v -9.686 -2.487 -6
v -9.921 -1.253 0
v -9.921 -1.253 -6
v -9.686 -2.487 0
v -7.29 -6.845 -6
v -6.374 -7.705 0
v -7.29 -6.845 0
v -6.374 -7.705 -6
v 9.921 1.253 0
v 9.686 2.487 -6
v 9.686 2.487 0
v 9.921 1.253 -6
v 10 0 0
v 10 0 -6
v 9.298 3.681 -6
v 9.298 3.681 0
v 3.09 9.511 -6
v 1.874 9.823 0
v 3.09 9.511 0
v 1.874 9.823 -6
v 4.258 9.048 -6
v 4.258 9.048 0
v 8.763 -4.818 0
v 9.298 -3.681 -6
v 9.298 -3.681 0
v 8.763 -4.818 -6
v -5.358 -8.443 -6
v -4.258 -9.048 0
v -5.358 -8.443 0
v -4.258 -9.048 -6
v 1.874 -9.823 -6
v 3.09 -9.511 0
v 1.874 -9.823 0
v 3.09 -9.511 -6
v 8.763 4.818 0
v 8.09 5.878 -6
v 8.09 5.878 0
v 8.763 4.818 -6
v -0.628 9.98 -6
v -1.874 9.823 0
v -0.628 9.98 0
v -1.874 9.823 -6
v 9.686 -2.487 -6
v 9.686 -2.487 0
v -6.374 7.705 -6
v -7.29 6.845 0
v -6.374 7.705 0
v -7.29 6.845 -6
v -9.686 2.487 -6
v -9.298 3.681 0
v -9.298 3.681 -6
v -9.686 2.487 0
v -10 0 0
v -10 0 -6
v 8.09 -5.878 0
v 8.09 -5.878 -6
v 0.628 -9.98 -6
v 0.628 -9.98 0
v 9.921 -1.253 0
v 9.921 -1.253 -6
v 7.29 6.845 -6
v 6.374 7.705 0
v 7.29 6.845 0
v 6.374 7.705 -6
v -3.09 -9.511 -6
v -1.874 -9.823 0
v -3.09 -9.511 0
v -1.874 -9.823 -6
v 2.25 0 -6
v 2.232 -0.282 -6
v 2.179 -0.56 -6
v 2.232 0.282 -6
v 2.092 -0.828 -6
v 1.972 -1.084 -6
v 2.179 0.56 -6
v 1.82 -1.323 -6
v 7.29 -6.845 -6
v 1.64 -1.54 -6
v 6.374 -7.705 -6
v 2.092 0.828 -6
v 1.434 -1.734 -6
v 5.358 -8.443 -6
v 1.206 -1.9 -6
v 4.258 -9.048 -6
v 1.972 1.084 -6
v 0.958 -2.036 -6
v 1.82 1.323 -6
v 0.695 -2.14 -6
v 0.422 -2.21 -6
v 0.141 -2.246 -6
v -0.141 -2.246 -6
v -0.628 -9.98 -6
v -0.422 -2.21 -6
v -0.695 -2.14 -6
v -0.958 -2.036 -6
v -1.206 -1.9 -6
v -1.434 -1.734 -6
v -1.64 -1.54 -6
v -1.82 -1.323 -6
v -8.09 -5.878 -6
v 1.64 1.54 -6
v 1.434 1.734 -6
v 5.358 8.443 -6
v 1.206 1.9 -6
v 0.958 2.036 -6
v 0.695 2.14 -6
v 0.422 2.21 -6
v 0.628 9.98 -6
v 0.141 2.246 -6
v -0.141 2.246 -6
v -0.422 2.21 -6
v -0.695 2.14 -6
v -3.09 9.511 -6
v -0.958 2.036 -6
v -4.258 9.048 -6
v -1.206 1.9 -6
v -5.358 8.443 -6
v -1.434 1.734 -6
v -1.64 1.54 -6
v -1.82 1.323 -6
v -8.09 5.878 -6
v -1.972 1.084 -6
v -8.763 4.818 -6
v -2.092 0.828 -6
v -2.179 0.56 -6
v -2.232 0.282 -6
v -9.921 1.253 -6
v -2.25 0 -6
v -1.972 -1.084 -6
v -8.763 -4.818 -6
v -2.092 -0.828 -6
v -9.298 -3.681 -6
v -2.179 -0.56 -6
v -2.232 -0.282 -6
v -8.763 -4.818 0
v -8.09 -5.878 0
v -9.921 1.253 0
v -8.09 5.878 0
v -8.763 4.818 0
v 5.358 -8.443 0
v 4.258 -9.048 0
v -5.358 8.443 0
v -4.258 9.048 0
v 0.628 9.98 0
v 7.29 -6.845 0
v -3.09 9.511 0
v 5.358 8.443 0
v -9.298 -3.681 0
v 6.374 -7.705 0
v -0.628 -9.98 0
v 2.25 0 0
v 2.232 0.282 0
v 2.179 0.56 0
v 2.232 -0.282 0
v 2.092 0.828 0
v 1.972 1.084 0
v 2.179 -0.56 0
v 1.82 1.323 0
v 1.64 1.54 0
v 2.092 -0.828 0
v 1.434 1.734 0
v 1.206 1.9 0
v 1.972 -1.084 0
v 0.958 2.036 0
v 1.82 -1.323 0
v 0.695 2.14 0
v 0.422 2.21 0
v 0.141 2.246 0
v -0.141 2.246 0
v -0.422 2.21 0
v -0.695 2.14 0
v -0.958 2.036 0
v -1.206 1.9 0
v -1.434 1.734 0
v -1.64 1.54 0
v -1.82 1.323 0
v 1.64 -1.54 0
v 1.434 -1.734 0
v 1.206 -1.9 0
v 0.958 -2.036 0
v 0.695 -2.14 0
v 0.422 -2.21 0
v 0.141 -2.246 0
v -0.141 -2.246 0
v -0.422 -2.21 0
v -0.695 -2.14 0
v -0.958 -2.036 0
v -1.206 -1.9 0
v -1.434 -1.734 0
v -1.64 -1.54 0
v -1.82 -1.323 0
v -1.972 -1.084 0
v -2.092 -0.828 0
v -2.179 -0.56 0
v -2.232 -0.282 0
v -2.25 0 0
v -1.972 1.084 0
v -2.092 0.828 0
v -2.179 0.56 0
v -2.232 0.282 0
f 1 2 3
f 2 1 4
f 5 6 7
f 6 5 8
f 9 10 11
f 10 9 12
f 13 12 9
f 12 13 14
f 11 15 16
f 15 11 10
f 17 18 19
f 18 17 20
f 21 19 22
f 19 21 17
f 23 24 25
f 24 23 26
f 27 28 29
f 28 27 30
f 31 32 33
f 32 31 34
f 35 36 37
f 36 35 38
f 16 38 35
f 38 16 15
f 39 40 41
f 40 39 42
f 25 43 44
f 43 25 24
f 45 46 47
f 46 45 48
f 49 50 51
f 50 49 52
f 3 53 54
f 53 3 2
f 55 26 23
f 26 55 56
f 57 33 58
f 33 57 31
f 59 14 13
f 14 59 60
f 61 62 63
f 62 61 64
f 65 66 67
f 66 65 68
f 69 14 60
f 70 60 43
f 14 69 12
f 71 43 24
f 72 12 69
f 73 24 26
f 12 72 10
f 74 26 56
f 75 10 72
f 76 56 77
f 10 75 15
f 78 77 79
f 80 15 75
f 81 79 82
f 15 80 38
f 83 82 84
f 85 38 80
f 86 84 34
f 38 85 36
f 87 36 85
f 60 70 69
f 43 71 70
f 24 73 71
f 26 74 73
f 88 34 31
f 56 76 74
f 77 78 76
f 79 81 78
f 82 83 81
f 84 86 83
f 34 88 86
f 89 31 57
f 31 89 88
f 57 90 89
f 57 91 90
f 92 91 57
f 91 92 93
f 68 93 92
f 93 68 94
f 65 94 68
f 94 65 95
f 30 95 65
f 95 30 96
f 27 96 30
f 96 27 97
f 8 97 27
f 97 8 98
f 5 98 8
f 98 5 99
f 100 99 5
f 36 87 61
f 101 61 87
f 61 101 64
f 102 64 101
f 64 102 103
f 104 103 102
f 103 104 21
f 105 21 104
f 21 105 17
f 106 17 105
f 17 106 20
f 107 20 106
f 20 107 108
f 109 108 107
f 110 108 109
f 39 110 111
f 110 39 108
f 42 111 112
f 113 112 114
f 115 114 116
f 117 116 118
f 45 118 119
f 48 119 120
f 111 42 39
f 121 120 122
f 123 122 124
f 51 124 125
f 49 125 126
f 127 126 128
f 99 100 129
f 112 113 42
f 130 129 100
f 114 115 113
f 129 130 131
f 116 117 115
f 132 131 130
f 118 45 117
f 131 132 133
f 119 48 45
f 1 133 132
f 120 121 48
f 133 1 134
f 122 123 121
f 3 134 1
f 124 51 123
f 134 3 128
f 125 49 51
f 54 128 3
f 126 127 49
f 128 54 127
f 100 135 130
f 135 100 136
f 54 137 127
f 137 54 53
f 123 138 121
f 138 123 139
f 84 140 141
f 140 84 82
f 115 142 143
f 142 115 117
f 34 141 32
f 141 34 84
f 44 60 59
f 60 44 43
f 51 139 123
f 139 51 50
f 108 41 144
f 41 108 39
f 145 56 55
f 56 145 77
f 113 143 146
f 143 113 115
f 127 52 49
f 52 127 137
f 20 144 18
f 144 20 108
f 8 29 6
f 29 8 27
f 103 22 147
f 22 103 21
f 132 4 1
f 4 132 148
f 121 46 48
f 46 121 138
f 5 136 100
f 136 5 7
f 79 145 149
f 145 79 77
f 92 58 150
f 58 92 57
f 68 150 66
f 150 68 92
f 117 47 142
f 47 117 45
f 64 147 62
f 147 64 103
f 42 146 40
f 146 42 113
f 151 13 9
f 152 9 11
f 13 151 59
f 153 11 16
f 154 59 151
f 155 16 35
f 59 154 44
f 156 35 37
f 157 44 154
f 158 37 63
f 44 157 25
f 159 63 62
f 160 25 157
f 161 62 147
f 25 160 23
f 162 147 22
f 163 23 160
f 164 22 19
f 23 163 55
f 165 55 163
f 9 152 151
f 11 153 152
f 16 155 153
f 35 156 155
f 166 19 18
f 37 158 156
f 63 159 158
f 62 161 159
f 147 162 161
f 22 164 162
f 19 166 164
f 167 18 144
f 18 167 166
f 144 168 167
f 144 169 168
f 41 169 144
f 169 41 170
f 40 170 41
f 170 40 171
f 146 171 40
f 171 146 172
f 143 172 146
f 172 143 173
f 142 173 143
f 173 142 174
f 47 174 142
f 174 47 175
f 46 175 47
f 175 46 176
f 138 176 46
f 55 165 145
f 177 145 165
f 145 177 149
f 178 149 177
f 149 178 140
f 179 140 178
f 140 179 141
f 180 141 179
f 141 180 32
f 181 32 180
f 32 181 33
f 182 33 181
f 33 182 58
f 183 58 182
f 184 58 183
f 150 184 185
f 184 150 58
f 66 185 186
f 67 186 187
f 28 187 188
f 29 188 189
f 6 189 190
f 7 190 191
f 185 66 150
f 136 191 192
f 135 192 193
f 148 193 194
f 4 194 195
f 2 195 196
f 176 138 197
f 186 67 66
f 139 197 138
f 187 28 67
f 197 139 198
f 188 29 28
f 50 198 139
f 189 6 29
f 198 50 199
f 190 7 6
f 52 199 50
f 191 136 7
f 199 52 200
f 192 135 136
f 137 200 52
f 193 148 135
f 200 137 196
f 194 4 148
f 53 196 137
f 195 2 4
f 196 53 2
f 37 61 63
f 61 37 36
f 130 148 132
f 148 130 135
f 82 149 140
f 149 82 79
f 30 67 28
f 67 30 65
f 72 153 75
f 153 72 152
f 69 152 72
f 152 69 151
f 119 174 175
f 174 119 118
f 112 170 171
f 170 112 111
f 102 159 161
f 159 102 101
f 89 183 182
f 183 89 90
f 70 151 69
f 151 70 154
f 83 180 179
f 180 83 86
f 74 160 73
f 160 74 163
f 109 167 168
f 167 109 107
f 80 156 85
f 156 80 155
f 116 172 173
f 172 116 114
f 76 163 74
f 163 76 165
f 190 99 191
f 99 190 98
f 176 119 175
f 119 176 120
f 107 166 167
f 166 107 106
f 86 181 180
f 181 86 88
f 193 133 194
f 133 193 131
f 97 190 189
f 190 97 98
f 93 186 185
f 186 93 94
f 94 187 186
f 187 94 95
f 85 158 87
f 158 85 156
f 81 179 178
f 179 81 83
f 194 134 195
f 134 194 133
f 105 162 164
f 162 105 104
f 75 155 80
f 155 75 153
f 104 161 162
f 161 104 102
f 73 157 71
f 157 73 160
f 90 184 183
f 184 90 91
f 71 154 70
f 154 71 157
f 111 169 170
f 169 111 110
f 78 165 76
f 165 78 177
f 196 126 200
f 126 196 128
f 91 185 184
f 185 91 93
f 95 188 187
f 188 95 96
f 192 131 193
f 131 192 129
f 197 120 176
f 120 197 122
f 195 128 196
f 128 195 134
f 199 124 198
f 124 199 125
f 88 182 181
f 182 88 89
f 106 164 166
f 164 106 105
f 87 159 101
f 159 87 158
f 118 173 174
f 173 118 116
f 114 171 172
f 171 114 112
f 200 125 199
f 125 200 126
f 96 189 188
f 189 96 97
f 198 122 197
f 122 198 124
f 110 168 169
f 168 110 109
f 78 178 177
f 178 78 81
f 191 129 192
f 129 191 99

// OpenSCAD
$fn = 50;


difference() {
	union() {
		translate(v = [0, 0, -6.0000000000]) {
			cylinder(h = 6, r = 10.0000000000);
		}
		cylinder(h = 0, r = 16.0000000000);
	}
	union() {
		#translate(v = [0, 0, -6]) {
			cylinder(h = 6, r = 2.2500000000);
		}
	}
}
